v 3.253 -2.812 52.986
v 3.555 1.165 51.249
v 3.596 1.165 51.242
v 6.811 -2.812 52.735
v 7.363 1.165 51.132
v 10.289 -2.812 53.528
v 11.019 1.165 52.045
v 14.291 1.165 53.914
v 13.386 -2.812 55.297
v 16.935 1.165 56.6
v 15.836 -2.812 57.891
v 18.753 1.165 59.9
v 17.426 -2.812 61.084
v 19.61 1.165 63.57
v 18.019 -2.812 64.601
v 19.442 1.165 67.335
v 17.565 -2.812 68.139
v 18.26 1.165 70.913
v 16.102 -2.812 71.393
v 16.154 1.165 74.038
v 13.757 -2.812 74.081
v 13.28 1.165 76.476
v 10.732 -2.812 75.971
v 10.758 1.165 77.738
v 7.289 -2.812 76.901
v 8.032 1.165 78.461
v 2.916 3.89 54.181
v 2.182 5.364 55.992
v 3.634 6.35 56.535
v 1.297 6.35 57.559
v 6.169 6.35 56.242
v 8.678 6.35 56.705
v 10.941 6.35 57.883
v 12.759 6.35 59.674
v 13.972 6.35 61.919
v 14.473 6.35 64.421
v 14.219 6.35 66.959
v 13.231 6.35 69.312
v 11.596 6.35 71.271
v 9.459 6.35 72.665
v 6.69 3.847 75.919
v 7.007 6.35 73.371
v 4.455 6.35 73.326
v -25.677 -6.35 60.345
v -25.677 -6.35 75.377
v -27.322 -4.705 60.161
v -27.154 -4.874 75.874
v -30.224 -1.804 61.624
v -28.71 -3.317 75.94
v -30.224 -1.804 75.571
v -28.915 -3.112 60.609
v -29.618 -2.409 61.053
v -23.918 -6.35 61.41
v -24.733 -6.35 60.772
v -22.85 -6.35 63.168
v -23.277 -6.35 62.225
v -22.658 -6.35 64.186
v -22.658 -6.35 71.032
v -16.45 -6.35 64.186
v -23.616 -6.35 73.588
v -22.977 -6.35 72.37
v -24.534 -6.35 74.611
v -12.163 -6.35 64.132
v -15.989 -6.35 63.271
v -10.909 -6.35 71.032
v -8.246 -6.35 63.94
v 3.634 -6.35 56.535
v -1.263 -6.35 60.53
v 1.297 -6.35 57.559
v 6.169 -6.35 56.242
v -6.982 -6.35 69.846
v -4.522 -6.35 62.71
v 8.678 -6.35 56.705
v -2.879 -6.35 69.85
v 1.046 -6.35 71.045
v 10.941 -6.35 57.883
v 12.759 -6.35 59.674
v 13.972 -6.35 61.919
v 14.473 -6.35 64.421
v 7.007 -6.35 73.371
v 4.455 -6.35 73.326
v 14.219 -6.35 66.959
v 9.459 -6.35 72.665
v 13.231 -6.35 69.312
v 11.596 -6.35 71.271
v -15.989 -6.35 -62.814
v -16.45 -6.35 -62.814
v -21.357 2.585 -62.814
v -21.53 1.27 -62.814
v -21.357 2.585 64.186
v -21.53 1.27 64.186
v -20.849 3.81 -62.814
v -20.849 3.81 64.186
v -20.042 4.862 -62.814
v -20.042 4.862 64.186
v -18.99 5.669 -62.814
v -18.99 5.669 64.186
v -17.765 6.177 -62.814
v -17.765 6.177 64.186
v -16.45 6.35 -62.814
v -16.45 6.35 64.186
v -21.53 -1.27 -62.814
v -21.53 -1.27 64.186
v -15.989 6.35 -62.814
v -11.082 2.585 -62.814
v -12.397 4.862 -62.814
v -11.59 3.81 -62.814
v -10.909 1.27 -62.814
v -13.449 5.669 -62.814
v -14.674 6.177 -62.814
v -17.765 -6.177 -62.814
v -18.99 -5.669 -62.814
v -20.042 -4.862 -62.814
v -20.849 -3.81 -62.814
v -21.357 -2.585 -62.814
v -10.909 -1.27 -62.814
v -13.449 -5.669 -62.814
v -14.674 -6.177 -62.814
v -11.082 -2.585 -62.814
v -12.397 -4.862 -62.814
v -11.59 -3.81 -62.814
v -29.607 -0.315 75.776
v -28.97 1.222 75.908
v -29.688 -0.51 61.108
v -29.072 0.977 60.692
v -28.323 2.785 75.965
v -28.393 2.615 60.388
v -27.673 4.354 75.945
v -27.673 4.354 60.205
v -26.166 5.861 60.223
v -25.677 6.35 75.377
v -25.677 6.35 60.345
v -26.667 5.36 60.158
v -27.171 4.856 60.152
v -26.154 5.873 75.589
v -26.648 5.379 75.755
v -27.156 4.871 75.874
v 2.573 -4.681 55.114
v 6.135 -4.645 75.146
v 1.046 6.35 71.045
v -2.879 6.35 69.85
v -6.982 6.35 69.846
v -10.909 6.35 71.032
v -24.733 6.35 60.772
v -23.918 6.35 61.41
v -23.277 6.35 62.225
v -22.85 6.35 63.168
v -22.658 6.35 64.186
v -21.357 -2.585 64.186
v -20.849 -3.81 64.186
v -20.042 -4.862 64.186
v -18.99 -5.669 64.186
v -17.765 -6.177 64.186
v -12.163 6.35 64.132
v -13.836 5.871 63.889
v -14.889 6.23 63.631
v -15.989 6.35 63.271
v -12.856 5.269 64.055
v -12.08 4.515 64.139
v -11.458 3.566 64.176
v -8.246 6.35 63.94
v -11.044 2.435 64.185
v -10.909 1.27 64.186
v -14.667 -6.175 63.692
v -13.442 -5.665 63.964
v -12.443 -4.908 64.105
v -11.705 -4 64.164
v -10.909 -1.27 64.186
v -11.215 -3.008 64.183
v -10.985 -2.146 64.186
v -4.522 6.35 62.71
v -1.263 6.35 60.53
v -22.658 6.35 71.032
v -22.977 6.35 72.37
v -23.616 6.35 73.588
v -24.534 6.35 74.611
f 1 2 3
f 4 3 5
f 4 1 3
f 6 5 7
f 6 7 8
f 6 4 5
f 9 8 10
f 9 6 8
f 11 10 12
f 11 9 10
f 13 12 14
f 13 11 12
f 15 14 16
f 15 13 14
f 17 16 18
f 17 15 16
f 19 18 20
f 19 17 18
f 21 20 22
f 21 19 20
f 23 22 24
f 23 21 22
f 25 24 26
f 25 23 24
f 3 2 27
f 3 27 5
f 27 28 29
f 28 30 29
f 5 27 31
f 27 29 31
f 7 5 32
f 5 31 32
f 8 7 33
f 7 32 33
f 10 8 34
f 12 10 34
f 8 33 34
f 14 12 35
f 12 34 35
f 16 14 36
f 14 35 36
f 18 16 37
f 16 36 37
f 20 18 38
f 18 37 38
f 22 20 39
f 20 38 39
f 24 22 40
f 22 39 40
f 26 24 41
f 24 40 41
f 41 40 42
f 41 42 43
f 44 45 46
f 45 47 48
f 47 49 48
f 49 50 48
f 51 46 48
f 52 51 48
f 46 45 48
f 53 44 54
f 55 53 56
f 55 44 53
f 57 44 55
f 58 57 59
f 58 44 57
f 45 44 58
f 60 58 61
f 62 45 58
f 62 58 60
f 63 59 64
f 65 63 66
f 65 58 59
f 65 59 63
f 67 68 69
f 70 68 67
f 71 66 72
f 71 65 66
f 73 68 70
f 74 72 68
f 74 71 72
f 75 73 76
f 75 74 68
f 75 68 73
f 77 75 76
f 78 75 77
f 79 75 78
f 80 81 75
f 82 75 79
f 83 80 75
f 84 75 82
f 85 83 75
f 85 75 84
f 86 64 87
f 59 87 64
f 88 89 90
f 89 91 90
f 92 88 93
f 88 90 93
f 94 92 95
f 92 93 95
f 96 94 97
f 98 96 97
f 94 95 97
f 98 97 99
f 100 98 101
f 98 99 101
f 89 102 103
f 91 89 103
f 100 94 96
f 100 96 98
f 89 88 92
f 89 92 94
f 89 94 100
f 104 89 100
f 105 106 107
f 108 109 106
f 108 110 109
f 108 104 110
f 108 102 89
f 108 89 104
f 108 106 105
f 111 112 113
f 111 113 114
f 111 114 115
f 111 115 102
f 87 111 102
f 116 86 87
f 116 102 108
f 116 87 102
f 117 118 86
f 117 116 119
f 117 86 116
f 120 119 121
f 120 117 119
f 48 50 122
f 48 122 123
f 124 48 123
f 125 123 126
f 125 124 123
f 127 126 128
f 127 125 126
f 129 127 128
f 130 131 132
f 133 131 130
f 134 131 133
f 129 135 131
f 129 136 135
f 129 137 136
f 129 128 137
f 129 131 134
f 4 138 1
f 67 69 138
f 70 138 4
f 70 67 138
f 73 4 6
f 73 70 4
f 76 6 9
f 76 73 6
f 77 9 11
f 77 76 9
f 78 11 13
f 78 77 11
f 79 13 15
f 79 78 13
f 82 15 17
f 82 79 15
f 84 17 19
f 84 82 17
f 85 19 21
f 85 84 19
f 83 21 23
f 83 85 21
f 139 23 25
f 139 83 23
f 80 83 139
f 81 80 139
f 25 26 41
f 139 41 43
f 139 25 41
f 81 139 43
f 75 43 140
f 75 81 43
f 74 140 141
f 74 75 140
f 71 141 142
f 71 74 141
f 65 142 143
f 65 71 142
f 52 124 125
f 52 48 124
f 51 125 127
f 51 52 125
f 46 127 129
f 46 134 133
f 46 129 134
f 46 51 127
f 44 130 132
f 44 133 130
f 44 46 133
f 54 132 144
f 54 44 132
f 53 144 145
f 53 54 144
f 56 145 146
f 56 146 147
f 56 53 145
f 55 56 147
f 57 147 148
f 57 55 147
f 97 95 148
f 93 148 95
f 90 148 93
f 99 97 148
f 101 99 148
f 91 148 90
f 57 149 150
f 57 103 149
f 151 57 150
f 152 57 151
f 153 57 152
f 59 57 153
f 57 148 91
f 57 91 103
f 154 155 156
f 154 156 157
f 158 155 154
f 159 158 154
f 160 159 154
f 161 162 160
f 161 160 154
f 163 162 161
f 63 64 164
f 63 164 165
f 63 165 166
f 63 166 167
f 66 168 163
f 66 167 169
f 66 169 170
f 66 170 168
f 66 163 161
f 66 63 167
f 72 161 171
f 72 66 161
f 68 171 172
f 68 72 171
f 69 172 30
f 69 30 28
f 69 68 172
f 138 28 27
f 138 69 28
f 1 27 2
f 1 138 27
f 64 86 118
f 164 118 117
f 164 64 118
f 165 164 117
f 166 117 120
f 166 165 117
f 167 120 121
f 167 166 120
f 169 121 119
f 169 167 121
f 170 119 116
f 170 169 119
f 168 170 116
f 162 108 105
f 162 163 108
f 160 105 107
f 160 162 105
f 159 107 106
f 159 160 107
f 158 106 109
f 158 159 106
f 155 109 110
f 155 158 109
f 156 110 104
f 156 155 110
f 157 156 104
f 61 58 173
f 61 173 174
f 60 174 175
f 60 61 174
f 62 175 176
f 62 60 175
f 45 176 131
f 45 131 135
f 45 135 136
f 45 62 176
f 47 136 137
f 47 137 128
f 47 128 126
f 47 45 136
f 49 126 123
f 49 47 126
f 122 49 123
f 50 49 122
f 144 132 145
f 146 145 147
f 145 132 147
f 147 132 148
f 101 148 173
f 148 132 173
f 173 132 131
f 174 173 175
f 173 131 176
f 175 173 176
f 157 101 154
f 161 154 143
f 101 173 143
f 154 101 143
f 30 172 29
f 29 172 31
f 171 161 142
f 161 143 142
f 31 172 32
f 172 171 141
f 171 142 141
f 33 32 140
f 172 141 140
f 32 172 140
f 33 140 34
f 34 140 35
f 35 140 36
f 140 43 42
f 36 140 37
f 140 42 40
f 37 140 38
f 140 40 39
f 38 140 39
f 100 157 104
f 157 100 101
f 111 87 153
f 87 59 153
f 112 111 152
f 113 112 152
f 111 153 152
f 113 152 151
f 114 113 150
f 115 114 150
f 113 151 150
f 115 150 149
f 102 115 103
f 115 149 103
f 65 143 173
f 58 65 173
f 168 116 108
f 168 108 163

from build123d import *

# Parameters (mm, degrees)
F0_W        = 10.6210811783
F0_H        = 127
F1_DEPTH    = 6.35
F2_DEPTH    = 6.35
F3_SIZE     = 5.334
F4_T2_ANGLE = 234.6452810907
F5_SIZE     = 5.588
F6_T1_DEPTH = 37.3754237446
F7_R        = 5.08
F8_R        = 5.08


# Not quite as in the source:
# - a fillet or chamfer that OpenCascade refuses, or shapes differently, is made with other operations: its cross-section is extruded or revolved along the edge and cut away or added
# - a feature names something its author has since deleted; it is built from what else it names


with BuildPart() as f1:
    # F0 (on Front) → F1 (new body)
    with BuildSketch(Plane.XZ):
        with BuildLine():
            ThreePointArc((-31.2650664442, 63.9850506011), (-26.8698078998, 60.1482815757), (-22.6583778858, 64.185972929))
            Line((-22.6583778858, 64.185972929), (-21.5300321579, 64.185972929))
            Line((-21.5300321579, 64.185972929), (-10.9089509796, 64.185972929))
            ThreePointArc((-10.9089509796, 64.185972929), (-1.1488196144, 60.4281603773), (3.5711703362, 51.0952608115))
            ThreePointArc((3.5711703362, 51.0952608115), (19.6335156732, 62.5824206191), (8.0880673261, 78.602920007))
            ThreePointArc((8.0880673261, 78.602920007), (0.2340476898, 70.6911078158), (-10.9089509796, 71.0316621421))
            Line((-10.9089509796, 71.0316621421), (-22.6583778858, 71.0316621421))
            ThreePointArc((-22.6583778858, 71.0316621421), (-25.8366796537, 75.4537471146), (-31.2650664442, 75.0189431538))
            Line((-31.2650664442, 75.0189431538), (-31.2650664442, 63.9850506011))
        make_face()
        with Locations((-16.2194915688, 0.685972929)):
            Rectangle(F0_W, F0_H)
    extrude(amount=F1_DEPTH)

    # F0 (on Front) → F2 (join)
    with BuildSketch(Plane.XZ):
        with BuildLine():
            ThreePointArc((-31.2650664442, 63.9850506011), (-26.8698078998, 60.1482815757), (-22.6583778858, 64.185972929))
            Line((-22.6583778858, 64.185972929), (-21.5300321579, 64.185972929))
            Line((-21.5300321579, 64.185972929), (-10.9089509796, 64.185972929))
            ThreePointArc((-10.9089509796, 64.185972929), (-1.1488196144, 60.4281603773), (3.5711703362, 51.0952608115))
            ThreePointArc((3.5711703362, 51.0952608115), (19.6335156732, 62.5824206191), (8.0880673261, 78.602920007))
            ThreePointArc((8.0880673261, 78.602920007), (0.2340476898, 70.6911078158), (-10.9089509796, 71.0316621421))
            Line((-10.9089509796, 71.0316621421), (-22.6583778858, 71.0316621421))
            ThreePointArc((-22.6583778858, 71.0316621421), (-25.8366796537, 75.4537471146), (-31.2650664442, 75.0189431538))
            Line((-31.2650664442, 75.0189431538), (-31.2650664442, 63.9850506011))
        make_face()
        with Locations((-16.2194915688, 0.685972929)):
            Rectangle(F0_W, F0_H)
    extrude(amount=-F2_DEPTH)

    # F3
    f3_edges = [f1.edges().sort_by_distance(p)[0] for p in [
        (19.633516, -6.35, 62.582421),
        (19.633516, 6.35, 62.582421),
    ]]
    chamfer(f3_edges, length=F3_SIZE)

    # F4: chamfer of 2.54 on 1 edges, made by hand

    # F4_s1 → F4_t2 (revolve, cut)
    with BuildSketch(Plane(origin=(-27.2674669531, 0, 20.2858371039), x_dir=(0, 1, 0), z_dir=(-0.8023210272, 0, 0.596892762))):
        Polygon((1.524, -41.5945799258), (-2.8120512242, -43.39063115), (-1.016, -41.5945799258), align=None)
    revolve(axis=Axis((5.8795952776, -1.016, 64.8408840236), (0, -1, 0)), revolution_arc=F4_T2_ANGLE, mode=Mode.SUBTRACT)

    # F5
    f5_edges = [f1.edges().sort_by_distance(p)[0] for p in [
        (-31.265066, 6.35, 69.501997),
        (-31.265066, -6.35, 69.501997),
    ]]
    chamfer(f5_edges, length=F5_SIZE)

    # F6: chamfer of 5.08 on 1 edges, made by hand

    # F6_s2 → F6_t1 (cut)
    with BuildSketch(Plane.XY.offset(50.8142850052)):
        Polygon((-31.2650664442, -4.318), (-27.6729639958, 4.3541024484), (-31.2650664442, 0.762), align=None)
    extrude(amount=F6_T1_DEPTH, mode=Mode.SUBTRACT)

    # F7
    f7_edges = [f1.edges().sort_by_distance(p)[0] for p in [
        (-10.908951, -6.35, 0.685973),
        (-10.908951, 6.35, 0.685973),
    ]]
    fillet(f7_edges, radius=F7_R)

    # F8
    f8_edges = [f1.edges().sort_by_distance(p)[0] for p in [
        (-21.530032, 6.35, 0.685973),
        (-21.530032, -6.35, 0.685973),
    ]]
    fillet(f8_edges, radius=F8_R)


solid = f1.part
